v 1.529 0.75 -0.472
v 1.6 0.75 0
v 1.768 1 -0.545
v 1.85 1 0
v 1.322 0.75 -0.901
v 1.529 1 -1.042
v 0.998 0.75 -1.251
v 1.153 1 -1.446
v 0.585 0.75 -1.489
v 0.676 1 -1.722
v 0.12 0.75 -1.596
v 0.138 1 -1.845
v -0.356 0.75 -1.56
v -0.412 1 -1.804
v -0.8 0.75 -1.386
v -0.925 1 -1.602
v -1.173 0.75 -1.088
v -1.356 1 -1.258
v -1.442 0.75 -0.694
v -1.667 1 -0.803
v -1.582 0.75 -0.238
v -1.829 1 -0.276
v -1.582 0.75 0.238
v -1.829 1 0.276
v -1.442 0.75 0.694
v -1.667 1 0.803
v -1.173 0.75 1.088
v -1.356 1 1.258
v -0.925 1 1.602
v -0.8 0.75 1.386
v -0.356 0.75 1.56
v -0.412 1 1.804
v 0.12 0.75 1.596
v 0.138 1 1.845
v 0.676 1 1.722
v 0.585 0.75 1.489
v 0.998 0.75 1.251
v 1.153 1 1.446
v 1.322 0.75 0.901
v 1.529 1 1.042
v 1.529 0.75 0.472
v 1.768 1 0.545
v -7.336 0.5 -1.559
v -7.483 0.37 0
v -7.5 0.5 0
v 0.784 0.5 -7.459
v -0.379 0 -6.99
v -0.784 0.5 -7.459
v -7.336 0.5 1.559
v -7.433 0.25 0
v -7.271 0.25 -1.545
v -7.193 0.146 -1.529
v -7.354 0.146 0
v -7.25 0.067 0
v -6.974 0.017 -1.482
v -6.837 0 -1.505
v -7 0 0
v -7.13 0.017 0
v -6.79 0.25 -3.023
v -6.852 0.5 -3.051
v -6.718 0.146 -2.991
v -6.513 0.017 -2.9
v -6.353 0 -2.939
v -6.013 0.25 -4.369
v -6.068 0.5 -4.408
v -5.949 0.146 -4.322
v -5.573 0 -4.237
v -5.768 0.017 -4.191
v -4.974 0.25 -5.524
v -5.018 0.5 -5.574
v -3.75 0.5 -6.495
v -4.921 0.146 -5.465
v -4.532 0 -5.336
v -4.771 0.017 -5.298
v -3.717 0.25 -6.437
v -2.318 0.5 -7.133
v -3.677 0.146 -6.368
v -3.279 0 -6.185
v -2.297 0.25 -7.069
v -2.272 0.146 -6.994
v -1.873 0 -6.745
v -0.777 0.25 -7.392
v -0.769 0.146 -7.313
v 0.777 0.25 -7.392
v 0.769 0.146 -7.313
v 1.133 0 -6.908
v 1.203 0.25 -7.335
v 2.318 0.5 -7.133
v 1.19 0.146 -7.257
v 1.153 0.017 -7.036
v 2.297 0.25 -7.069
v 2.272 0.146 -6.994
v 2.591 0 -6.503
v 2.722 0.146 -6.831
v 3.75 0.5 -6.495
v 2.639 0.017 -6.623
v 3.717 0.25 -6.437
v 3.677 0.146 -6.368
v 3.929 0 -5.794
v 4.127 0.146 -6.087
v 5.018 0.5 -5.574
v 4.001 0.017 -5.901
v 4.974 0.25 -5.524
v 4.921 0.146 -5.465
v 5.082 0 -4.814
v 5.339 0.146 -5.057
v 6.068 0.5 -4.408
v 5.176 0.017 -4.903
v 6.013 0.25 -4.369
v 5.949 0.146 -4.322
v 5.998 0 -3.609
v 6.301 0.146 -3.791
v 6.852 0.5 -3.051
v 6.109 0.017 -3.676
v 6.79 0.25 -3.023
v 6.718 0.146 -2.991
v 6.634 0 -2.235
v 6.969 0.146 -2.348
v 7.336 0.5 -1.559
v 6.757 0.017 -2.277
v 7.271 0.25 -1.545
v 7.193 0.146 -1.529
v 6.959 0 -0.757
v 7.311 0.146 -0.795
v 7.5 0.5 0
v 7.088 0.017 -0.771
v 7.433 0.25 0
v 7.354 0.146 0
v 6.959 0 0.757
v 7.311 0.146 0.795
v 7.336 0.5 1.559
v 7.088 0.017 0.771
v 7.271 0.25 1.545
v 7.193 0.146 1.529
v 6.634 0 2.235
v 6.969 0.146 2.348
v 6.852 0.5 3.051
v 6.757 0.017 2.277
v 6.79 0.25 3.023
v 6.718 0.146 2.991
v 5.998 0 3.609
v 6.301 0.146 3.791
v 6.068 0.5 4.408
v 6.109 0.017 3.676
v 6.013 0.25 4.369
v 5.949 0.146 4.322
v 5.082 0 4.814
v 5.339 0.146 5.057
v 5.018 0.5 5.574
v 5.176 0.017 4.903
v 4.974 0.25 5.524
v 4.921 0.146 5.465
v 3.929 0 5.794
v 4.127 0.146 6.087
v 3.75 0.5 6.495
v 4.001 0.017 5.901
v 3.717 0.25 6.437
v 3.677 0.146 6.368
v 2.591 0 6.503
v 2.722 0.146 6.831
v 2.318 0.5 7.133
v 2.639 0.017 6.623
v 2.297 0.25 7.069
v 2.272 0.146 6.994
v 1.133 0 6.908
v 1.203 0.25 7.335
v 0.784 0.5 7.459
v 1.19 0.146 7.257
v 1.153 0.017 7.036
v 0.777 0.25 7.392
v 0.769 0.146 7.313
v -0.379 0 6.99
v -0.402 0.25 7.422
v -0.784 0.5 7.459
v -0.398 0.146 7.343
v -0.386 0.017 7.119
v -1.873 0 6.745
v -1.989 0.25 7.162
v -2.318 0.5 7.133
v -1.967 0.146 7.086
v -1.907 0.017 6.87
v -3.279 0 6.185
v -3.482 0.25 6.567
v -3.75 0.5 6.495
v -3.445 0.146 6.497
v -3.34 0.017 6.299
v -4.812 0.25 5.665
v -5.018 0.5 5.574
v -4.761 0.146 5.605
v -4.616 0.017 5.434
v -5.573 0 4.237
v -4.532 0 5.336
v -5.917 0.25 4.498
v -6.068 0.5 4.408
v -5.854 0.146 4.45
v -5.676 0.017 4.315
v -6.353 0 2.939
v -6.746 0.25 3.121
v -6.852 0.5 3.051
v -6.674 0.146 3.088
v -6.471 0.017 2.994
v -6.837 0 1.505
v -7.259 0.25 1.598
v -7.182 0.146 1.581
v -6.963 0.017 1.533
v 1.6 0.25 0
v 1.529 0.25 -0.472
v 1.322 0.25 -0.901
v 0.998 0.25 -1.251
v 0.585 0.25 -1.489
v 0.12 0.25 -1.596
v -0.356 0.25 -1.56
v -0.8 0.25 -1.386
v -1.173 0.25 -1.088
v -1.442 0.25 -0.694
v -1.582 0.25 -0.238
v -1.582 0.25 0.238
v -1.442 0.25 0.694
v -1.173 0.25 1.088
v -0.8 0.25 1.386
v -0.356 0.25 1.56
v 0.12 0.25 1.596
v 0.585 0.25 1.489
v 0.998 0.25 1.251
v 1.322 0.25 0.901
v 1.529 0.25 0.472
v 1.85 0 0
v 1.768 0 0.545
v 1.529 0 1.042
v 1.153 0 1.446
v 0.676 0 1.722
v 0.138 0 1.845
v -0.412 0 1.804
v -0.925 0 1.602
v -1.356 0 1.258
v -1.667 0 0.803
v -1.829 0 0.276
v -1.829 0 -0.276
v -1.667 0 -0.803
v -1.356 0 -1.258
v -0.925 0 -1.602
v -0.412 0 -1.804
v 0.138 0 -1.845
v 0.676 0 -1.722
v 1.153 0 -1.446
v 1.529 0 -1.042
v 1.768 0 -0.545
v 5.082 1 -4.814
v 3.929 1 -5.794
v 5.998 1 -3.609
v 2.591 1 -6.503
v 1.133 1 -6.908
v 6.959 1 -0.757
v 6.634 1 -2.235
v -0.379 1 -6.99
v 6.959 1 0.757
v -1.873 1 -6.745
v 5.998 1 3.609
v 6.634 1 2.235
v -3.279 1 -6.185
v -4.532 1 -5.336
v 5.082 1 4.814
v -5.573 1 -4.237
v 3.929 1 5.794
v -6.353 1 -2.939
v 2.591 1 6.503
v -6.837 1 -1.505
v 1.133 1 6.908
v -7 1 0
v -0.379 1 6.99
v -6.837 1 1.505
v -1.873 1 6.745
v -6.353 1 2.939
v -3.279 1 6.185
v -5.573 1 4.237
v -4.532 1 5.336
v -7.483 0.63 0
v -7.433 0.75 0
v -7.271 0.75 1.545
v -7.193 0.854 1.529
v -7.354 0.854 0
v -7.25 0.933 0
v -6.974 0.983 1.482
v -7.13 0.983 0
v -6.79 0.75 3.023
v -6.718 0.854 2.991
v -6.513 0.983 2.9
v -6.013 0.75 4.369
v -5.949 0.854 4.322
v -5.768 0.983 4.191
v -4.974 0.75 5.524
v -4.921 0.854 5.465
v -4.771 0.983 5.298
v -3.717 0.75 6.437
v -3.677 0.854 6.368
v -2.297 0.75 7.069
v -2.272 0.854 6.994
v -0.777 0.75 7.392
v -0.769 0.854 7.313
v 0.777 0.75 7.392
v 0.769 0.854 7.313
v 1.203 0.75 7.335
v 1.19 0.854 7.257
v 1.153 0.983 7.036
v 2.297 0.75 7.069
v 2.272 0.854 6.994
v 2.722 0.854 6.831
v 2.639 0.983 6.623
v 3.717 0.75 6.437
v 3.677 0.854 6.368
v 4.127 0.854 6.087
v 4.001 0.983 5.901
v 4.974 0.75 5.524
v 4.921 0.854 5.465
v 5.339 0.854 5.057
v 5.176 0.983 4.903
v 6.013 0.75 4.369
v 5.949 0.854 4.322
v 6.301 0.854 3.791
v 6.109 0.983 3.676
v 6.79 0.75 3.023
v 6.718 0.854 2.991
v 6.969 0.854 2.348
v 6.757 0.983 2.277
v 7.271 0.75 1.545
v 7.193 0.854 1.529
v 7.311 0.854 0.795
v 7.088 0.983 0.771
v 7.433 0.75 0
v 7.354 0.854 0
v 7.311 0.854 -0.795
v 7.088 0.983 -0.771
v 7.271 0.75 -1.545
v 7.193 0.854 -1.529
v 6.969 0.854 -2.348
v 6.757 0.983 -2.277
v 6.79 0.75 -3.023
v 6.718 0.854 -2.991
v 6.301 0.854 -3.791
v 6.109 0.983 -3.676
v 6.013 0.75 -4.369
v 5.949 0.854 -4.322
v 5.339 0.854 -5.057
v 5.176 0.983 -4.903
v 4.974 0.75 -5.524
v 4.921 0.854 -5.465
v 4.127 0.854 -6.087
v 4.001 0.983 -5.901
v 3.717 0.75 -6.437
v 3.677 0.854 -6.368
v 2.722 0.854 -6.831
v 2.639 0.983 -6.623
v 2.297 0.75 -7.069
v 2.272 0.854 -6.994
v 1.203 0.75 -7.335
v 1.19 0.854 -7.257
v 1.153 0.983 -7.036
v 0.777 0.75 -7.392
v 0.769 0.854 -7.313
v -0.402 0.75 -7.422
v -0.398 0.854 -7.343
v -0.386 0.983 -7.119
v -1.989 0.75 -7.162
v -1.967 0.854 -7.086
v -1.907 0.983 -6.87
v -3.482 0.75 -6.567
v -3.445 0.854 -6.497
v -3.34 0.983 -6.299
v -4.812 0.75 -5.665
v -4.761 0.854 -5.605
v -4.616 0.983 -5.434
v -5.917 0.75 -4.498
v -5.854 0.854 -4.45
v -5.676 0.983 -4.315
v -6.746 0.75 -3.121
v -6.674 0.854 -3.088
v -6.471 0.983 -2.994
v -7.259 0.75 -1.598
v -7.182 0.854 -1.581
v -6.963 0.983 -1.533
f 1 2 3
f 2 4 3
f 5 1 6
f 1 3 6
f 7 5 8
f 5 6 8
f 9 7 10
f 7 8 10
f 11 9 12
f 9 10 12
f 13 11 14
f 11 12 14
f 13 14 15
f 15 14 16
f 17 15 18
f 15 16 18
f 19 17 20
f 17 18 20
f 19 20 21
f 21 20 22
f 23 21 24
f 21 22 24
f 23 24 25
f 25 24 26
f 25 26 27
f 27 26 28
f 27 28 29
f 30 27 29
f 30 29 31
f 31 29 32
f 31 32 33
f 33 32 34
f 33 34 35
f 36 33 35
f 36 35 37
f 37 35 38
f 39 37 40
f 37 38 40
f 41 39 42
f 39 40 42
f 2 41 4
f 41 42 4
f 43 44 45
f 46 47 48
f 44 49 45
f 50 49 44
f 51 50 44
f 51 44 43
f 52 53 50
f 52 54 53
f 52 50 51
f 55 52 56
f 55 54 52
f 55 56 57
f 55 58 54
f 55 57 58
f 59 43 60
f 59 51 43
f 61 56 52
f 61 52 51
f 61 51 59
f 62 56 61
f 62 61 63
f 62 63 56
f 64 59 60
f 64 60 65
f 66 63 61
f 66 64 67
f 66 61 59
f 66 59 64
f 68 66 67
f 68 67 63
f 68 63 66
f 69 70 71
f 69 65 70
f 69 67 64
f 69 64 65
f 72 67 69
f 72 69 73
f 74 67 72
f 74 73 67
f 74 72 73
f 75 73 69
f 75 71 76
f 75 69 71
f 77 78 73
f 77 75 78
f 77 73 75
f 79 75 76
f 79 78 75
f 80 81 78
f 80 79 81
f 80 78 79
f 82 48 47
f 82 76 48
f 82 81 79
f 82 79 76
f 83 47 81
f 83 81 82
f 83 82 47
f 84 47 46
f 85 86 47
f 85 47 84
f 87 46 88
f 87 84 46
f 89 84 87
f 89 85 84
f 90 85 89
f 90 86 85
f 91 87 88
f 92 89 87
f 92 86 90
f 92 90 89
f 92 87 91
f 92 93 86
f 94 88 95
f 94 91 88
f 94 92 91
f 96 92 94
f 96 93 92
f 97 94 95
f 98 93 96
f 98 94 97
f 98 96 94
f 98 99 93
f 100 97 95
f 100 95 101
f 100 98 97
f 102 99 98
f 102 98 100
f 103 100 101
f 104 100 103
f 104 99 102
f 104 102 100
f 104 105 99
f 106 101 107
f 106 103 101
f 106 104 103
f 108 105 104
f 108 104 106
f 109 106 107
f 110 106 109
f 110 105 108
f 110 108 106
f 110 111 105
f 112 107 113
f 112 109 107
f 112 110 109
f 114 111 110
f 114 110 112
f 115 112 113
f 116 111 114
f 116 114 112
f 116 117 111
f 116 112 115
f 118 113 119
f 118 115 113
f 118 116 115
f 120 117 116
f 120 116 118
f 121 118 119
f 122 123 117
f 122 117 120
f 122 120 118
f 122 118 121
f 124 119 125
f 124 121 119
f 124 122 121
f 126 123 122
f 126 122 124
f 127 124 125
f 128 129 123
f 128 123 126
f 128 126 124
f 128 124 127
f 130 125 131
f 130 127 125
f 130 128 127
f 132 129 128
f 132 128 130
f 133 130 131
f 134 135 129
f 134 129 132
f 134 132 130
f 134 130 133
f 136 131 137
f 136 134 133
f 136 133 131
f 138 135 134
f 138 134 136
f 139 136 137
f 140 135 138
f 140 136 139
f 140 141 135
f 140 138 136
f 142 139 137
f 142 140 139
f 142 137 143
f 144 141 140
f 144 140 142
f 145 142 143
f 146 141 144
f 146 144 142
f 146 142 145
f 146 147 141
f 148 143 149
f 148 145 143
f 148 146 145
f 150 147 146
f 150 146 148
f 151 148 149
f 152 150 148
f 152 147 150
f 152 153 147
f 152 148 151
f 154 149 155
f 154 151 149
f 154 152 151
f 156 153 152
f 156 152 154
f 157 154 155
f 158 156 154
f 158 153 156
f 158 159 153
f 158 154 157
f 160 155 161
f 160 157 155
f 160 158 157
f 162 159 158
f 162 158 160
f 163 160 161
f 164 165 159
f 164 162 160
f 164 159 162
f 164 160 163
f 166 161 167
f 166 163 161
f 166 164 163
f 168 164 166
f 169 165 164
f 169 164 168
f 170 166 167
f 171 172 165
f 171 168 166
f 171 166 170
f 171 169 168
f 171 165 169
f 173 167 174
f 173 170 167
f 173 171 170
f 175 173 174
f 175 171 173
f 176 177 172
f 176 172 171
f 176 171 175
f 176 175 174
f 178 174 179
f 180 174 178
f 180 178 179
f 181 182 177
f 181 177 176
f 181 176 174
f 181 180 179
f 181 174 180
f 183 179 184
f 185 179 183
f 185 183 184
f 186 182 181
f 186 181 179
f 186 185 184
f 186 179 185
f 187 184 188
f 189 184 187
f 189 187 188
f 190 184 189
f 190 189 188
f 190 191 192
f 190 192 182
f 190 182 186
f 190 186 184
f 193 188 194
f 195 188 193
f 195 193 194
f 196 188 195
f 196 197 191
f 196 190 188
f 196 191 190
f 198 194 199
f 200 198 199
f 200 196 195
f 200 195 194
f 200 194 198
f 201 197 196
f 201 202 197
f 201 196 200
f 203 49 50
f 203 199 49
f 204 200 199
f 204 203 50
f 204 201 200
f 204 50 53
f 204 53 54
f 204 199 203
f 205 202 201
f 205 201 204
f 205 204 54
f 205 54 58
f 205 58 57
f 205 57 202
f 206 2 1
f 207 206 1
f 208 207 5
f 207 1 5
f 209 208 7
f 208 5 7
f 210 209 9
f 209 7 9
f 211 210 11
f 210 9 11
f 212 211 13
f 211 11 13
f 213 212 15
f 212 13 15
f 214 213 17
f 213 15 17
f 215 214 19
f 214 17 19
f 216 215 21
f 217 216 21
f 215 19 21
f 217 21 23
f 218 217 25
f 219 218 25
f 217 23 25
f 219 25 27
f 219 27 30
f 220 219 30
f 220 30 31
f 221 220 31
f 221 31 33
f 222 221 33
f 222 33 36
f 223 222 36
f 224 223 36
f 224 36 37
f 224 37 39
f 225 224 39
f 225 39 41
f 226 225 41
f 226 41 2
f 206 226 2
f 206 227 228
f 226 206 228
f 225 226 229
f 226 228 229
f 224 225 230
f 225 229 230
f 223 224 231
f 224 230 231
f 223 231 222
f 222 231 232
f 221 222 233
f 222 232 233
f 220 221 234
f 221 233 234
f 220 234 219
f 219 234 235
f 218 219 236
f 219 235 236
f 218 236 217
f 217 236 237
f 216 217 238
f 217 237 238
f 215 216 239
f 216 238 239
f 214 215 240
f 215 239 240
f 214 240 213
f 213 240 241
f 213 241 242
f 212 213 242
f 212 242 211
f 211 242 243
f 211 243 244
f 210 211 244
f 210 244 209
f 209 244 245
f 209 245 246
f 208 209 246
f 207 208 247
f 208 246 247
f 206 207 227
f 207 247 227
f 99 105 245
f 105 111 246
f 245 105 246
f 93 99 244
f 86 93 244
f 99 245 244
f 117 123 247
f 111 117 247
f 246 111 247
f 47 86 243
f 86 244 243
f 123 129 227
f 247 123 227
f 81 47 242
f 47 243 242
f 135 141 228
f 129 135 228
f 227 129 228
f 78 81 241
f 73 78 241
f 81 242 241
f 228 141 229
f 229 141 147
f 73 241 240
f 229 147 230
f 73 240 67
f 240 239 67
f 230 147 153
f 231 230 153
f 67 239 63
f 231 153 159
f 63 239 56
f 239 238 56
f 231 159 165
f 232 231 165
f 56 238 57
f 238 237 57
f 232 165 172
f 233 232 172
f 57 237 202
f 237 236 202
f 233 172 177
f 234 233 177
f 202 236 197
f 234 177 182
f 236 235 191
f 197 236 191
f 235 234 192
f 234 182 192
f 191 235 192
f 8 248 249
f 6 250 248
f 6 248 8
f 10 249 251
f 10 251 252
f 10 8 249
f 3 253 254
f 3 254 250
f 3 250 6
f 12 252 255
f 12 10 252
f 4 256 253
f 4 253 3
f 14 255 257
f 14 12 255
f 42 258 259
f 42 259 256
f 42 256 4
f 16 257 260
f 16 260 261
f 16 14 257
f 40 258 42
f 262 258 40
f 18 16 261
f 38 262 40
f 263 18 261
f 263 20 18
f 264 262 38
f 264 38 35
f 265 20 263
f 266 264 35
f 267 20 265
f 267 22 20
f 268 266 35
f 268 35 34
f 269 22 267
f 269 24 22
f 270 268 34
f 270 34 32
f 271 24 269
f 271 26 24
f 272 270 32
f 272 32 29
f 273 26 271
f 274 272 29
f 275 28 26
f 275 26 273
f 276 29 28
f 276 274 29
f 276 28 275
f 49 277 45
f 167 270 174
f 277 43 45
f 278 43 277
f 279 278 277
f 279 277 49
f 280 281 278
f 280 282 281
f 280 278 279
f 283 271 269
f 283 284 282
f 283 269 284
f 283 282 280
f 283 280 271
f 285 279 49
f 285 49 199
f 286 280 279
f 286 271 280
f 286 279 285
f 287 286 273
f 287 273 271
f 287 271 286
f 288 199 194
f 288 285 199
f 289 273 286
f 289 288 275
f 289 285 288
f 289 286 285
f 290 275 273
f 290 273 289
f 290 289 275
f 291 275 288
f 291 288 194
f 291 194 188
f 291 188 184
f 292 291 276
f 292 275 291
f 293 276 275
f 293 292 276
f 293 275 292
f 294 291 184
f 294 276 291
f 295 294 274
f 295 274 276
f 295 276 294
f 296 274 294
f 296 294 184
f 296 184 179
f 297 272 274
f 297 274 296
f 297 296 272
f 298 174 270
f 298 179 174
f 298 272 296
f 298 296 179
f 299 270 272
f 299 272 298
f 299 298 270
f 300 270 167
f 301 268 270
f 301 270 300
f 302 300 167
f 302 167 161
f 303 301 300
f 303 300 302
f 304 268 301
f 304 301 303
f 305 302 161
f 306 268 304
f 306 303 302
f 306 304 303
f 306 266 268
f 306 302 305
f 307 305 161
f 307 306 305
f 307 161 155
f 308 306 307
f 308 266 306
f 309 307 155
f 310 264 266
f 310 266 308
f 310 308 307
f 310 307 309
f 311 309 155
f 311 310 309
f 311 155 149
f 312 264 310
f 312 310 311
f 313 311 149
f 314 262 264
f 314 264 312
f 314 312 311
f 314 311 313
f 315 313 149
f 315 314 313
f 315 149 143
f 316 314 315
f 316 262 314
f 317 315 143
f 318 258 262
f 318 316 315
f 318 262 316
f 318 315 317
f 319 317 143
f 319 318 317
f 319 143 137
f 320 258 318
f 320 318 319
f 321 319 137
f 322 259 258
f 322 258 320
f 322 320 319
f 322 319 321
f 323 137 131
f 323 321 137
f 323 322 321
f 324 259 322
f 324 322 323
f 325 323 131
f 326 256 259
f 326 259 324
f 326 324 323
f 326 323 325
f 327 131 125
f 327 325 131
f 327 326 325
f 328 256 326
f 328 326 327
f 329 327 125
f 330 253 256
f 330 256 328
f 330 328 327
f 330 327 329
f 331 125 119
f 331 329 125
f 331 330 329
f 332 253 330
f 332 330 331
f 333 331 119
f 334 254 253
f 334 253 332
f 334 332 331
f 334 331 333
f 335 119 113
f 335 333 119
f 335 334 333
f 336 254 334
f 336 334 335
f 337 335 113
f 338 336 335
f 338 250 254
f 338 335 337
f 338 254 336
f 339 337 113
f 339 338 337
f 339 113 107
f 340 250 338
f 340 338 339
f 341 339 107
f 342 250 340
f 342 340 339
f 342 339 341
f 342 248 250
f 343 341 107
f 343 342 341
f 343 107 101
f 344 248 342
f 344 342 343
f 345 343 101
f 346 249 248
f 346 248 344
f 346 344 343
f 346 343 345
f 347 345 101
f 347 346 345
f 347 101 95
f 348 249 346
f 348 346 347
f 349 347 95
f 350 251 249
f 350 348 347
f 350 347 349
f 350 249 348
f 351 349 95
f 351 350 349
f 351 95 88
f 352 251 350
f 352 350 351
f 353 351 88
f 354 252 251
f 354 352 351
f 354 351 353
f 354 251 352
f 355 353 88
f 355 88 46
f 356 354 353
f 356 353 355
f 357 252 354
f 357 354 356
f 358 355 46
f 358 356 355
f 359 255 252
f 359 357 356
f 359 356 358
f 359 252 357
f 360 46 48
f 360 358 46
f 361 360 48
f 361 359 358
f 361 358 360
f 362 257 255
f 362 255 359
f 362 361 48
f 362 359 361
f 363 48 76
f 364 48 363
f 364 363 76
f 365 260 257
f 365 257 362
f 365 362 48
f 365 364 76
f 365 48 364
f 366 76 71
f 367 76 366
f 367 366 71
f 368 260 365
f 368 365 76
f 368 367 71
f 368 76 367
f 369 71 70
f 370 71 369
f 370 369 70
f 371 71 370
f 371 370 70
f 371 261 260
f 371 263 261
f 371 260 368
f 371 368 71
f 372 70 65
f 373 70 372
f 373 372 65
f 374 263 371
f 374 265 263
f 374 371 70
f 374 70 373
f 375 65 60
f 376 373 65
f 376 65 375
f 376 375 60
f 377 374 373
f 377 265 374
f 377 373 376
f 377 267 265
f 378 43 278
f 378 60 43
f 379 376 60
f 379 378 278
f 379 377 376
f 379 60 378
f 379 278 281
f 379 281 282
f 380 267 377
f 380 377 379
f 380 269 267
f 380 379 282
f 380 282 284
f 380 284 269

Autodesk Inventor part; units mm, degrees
ref_plane "YZ Plane" through (0, 0, 0) normal (1, 0, 0) x (0, 1, 0)
ref_plane "XZ Plane" through (0, 0, 0) normal (0, 1, 0) x (-1, 0, 0)
sketch "Sketch1" plane through (0, 0, 0) normal (0, 1, 0) x (-1, 0, 0)
  circle A0 centre (0, 0) radius 7.5
  dimension "d0" = 15
extrude "Extrusion1" add sketch "Sketch1" along normal blind 1
ref_plane "Work Plane1" through (0, 1.5, 0) normal (0, 1, 0) x (1, 0, 0)
sketch "Sketch3" plane through (0, 1.5, 0) normal (0, 1, 0) x (1, 0, 0)
  circle A0 centre (0, 0) radius 1.6
  dimension "d7" = 3.2
extrude "Extrusion3" cut sketch "Sketch3" against normal up to surface (1.5 mm away)
fillet "Fillet2" radius 0.5 2 edges at (7.5, 0, 0) (7.5, 1, 0)
chamfer "Chamfer2" distance 0.25 angle 45 2 edges at (-1.6, 0, 0) (-1.6, 1, 0)
properties part number "BoxWasher"
